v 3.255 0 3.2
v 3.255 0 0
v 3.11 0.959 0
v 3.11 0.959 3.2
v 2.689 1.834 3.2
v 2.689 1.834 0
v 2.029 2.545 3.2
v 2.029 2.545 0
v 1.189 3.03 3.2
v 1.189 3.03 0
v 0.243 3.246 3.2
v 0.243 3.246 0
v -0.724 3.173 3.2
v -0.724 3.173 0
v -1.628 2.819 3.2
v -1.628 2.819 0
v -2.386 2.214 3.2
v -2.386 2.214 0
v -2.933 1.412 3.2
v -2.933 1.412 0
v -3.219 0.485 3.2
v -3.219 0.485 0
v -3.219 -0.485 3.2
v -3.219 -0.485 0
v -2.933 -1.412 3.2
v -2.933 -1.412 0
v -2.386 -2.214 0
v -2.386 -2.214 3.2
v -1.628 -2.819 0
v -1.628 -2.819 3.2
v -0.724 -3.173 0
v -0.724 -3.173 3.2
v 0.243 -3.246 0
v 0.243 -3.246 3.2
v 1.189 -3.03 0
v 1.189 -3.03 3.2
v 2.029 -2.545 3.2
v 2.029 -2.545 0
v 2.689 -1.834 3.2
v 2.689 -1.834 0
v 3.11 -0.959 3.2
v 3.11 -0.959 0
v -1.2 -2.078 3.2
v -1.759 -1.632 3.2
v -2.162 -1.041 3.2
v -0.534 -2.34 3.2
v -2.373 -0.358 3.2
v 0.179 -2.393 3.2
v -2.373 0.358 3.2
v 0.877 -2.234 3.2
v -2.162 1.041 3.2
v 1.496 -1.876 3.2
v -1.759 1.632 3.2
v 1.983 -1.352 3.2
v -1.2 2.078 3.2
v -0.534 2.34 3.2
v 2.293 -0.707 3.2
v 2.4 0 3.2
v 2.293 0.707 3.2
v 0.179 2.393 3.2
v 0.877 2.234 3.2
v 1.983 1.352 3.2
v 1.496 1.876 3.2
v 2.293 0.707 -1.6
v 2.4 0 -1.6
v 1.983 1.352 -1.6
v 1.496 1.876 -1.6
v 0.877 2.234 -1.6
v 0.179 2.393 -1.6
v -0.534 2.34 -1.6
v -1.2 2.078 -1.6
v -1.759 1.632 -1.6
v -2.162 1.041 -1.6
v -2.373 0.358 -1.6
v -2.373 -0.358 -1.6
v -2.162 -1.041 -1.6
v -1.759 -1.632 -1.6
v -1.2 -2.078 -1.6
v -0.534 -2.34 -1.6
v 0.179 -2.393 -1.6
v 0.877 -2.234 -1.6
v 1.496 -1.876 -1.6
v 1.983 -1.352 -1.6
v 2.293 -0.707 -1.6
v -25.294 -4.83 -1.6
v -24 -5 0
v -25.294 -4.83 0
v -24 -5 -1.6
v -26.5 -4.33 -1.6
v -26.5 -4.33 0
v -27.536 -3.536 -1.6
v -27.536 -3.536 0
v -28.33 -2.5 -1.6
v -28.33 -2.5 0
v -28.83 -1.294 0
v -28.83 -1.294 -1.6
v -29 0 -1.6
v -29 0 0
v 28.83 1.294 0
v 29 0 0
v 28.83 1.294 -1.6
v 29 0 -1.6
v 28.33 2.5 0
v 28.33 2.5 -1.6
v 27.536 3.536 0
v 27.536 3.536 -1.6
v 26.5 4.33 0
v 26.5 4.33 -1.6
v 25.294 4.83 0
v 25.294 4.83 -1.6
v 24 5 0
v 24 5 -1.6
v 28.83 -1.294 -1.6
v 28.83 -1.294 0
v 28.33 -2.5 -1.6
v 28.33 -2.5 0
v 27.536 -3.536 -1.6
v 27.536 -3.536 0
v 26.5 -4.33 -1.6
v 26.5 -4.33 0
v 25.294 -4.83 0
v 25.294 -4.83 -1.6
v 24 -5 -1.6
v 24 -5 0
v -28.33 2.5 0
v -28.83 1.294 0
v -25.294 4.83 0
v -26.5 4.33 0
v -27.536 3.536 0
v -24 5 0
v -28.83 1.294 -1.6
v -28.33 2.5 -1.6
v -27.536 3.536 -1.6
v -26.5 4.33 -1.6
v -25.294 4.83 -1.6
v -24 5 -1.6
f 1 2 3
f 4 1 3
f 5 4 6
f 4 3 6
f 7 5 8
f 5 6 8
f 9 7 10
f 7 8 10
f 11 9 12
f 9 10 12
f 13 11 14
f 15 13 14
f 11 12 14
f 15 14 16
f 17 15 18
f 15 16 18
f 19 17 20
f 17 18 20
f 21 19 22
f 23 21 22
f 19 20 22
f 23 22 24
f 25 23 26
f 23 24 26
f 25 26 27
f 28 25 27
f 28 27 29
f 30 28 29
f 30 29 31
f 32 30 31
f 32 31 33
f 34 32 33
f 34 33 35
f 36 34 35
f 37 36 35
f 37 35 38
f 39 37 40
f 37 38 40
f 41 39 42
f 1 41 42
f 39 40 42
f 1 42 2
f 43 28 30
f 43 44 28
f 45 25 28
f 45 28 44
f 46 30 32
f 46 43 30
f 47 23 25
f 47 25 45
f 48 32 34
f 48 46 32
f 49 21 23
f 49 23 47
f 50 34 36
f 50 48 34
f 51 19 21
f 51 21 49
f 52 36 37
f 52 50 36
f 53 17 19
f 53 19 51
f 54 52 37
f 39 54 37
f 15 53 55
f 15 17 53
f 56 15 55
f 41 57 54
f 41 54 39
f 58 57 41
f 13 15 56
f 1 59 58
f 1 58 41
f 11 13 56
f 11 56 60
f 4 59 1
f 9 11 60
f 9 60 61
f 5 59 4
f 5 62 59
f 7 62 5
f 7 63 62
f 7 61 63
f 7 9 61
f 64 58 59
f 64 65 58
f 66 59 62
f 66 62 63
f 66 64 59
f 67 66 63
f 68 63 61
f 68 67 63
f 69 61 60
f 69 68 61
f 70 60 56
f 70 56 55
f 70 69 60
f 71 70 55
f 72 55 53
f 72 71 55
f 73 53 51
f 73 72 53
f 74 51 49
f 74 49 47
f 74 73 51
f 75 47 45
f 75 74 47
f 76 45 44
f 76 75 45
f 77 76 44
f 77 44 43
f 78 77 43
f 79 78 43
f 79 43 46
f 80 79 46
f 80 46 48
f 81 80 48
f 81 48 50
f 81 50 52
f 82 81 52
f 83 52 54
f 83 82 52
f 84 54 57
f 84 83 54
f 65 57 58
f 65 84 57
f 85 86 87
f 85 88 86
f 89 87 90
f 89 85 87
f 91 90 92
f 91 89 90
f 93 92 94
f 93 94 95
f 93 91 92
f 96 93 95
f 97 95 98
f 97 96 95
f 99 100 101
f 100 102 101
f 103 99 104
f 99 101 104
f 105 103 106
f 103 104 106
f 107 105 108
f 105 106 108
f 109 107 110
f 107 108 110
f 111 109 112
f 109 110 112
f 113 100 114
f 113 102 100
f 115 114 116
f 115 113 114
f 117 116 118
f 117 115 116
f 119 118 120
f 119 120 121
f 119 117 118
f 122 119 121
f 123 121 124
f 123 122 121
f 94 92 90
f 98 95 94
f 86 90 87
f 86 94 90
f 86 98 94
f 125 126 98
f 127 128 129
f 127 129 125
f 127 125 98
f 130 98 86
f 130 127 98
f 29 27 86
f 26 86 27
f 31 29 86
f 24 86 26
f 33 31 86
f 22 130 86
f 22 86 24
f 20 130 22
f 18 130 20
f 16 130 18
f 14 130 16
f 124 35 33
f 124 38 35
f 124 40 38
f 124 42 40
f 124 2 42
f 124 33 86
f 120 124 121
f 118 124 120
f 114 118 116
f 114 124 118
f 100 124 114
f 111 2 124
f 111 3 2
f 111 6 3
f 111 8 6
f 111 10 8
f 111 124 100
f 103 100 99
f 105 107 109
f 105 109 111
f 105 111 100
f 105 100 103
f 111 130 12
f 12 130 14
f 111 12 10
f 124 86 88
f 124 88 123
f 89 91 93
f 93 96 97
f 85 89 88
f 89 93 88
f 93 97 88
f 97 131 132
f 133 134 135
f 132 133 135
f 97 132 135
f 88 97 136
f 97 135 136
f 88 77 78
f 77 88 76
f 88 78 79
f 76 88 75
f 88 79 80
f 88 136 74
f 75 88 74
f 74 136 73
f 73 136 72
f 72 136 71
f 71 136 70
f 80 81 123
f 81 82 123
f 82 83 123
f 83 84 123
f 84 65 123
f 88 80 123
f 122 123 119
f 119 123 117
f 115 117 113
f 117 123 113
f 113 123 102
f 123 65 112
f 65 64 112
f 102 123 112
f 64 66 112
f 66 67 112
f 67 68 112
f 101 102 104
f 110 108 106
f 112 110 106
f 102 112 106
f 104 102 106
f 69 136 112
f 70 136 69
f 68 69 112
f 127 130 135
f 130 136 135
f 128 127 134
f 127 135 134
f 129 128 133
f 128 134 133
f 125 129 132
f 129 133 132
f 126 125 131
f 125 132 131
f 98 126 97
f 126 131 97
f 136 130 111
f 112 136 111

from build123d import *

# Parameters (mm, degrees)
F0_W     = 58
F0_H     = 10
F0_R     = 2.4
F1_DEPTH = 1.6
F2_R     = 3.255
F2_R_2   = 2.4
F3_DEPTH = 3.2
F4_R     = 4.99999


# Not quite as in the source:
# - a fillet or chamfer is up to 0.001 mm smaller than in the source, because OpenCascade refuses the exact size


with BuildPart() as f1:
    # F0 (on Top) → F1 (new body)
    with BuildSketch(Plane.XY):
        Rectangle(F0_W, F0_H)
        Circle(F0_R, mode=Mode.SUBTRACT)
    extrude(amount=-F1_DEPTH)

    # F2 (on face) → F3 (join)
    with BuildSketch(Plane.XY):
        Circle(F2_R)
        Circle(F2_R_2, mode=Mode.SUBTRACT)
    extrude(amount=F3_DEPTH)

    # F4 (radius 5 in the source; OpenCascade refuses exactly that, so slightly less here)
    f4_edges = [f1.edges().sort_by_distance(p)[0] for p in [
        (29, 5, -0.8),
        (29, -5, -0.8),
        (-29, 5, -0.8),
        (-29, -5, -0.8),
    ]]
    fillet(f4_edges, radius=F4_R)


solid = f1.part
